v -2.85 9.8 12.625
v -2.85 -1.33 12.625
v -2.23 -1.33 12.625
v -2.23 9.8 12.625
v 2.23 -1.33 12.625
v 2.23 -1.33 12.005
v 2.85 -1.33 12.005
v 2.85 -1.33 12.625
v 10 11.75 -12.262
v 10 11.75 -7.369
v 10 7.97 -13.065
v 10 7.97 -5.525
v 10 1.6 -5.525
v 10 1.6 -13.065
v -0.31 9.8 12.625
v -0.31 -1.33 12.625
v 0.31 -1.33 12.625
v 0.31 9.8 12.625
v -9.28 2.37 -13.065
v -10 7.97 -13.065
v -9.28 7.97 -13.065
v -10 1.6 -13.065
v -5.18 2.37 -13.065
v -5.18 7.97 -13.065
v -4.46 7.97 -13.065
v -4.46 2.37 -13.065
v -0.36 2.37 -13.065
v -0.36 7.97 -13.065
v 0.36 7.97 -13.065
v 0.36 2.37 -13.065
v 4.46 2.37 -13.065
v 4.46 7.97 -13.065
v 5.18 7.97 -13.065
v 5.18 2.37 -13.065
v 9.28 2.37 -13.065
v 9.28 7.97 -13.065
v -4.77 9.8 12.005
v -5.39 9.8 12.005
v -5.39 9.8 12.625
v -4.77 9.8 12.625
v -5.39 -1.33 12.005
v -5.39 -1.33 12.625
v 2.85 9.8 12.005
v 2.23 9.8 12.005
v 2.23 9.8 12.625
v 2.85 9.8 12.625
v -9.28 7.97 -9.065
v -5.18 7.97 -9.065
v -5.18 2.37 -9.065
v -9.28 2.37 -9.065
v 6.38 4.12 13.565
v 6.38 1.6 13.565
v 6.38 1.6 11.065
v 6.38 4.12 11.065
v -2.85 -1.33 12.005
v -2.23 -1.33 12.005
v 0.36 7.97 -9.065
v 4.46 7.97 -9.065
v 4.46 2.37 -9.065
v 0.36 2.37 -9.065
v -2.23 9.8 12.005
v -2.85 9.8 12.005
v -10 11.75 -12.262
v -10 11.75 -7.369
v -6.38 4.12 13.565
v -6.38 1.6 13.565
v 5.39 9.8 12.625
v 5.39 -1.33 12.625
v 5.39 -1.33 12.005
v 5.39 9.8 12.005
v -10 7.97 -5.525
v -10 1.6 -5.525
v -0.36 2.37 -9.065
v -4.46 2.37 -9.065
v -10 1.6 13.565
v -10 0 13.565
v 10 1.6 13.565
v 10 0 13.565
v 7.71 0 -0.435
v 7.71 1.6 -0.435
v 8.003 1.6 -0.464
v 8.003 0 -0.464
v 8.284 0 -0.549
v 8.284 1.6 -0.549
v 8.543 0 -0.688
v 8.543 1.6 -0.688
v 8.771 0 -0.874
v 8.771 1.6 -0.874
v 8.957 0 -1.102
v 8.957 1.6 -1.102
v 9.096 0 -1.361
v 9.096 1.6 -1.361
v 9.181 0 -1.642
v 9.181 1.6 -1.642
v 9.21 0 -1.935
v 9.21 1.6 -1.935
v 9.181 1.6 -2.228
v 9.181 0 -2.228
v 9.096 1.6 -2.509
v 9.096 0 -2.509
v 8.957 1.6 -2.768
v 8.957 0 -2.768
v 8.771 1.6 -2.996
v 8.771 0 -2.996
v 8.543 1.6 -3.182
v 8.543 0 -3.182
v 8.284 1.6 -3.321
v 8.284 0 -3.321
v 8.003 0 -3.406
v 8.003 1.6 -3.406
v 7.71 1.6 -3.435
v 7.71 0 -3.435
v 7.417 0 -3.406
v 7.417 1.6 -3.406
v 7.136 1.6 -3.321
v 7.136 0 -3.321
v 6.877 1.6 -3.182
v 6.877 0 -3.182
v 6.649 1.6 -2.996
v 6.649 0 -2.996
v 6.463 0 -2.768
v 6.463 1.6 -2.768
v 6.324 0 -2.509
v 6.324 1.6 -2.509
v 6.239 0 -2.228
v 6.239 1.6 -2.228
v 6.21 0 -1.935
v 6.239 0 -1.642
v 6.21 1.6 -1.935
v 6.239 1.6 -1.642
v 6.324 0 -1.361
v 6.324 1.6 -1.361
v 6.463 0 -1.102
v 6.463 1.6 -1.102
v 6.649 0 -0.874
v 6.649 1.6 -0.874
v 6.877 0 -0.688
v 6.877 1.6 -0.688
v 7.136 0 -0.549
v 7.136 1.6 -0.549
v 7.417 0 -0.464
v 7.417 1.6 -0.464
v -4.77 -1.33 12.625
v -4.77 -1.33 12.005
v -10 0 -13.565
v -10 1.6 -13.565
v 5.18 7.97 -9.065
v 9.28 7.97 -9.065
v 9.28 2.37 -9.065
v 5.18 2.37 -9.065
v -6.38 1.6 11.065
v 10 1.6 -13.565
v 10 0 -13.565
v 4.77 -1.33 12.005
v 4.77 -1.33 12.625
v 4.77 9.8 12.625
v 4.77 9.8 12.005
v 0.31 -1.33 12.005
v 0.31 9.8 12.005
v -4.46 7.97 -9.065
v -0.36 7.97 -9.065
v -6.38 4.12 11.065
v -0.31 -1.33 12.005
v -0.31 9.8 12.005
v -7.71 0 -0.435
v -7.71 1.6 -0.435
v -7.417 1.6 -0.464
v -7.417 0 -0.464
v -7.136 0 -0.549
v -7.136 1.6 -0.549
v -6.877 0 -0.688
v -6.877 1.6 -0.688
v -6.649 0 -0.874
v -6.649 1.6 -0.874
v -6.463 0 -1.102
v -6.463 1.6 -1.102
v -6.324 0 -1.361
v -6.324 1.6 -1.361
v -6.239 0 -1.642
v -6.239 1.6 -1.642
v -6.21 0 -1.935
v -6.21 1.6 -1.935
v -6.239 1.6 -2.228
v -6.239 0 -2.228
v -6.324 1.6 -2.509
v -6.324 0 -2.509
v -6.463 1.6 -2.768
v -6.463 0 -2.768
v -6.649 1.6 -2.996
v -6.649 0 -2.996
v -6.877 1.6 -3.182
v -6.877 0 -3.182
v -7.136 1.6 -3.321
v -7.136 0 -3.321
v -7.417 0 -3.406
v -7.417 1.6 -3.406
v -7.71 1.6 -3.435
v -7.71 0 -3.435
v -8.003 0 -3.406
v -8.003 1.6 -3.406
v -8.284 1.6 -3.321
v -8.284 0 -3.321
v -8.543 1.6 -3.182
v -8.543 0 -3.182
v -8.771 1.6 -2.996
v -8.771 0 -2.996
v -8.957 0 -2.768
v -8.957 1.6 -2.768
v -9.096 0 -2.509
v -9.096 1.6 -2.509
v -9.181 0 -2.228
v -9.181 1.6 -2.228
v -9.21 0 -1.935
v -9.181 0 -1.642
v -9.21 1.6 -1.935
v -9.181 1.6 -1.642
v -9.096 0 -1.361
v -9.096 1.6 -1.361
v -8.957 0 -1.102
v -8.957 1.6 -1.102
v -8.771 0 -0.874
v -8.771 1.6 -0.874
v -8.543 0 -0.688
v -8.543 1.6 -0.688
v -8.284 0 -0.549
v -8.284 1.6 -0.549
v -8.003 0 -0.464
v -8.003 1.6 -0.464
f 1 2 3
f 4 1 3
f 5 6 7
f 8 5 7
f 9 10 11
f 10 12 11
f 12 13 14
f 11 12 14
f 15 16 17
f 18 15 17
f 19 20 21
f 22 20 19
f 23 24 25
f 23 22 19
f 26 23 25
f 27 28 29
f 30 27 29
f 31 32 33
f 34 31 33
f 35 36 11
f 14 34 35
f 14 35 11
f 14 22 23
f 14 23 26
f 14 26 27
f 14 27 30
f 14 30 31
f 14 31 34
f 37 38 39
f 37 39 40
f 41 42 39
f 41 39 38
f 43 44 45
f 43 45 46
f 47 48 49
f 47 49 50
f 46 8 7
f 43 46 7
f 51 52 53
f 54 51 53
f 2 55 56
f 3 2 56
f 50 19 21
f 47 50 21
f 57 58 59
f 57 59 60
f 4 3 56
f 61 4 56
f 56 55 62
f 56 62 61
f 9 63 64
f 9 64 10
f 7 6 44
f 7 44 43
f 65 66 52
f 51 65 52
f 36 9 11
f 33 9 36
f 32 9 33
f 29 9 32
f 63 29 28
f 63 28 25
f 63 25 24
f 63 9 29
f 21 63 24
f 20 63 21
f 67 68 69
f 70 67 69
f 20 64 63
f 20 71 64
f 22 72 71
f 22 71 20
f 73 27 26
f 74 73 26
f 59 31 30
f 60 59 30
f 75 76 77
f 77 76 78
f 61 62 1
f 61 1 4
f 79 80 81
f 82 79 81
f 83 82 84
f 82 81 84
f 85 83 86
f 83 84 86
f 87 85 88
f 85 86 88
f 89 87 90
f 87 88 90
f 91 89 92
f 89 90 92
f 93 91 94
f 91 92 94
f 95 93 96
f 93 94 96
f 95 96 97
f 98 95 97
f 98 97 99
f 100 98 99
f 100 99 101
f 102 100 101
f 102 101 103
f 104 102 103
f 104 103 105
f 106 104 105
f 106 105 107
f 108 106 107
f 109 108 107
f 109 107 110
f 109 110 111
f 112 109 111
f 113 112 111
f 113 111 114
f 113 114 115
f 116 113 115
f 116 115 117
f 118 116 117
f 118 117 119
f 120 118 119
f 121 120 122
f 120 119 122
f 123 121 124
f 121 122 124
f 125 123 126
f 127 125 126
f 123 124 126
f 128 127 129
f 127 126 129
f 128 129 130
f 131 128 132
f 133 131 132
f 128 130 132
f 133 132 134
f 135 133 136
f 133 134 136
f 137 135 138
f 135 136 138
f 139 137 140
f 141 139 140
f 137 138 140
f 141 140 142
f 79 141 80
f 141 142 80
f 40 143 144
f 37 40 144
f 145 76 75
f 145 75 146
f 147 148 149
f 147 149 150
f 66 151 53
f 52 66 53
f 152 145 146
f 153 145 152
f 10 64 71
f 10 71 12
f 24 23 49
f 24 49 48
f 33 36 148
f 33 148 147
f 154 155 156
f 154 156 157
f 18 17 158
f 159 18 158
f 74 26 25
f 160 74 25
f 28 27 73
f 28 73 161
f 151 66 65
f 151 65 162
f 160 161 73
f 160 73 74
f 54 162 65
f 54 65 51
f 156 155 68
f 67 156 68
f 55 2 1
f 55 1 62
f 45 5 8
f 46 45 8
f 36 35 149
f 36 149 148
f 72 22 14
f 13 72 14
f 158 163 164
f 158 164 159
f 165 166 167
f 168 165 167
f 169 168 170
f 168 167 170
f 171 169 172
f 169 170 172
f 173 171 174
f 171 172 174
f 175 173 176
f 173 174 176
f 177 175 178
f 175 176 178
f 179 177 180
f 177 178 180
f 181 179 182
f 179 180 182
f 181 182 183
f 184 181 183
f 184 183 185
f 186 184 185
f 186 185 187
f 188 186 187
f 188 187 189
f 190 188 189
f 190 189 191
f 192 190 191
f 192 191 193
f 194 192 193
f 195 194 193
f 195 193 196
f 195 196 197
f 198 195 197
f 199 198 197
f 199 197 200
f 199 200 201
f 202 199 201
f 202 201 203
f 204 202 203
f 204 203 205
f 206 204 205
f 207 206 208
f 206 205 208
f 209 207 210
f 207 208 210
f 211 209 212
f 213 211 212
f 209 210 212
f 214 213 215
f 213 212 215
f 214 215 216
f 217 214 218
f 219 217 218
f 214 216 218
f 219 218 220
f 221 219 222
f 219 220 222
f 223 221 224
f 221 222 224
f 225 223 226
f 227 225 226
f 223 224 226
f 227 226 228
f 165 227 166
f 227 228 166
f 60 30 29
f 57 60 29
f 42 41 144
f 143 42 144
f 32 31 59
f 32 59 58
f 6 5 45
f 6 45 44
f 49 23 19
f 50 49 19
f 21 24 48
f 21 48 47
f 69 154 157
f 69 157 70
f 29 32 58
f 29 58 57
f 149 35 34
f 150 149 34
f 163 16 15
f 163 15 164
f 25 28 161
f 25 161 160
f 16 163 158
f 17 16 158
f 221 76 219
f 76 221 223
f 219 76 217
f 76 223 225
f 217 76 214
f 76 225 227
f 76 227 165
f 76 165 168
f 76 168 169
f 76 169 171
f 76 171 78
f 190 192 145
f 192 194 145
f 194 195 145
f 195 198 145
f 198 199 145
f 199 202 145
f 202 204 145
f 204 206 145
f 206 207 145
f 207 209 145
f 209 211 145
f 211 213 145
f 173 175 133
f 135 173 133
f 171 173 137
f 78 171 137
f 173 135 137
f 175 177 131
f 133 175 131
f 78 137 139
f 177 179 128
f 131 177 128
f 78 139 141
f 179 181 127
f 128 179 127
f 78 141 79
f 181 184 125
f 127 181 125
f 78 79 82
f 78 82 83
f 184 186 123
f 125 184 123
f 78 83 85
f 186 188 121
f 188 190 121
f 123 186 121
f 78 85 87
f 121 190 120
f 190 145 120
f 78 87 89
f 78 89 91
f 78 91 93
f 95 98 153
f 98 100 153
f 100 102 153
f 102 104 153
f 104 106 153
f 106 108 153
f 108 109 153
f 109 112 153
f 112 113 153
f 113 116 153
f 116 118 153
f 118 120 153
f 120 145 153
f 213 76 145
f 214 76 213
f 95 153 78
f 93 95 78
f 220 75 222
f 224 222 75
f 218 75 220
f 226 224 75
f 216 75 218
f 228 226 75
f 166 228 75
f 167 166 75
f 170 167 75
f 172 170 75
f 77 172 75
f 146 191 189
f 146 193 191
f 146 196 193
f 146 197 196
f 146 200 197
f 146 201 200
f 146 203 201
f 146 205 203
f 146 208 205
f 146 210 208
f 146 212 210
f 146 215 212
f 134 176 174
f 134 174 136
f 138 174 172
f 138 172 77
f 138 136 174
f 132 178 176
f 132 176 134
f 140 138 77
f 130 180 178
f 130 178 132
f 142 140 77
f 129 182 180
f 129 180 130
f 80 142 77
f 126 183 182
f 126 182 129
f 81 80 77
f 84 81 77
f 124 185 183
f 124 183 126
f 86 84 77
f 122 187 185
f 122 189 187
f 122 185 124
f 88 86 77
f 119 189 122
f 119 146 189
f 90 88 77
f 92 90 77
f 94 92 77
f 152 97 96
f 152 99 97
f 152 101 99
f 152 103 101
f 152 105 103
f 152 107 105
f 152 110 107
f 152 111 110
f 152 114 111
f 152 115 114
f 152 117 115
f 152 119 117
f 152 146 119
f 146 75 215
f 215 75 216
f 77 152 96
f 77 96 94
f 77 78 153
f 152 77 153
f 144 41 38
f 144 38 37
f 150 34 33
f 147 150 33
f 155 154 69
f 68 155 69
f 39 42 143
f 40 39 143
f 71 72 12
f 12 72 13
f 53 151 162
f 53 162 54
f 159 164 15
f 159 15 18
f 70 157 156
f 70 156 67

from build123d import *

# Parameters (mm, degrees)
SKETCH1_W                  = 20
SKETCH1_H                  = 27.13
BOSS_EXTRUDE1_DEPTH        = 1.6
SKETCH2_W                  = 12.76
SKETCH2_H                  = 2.5
BOSS_EXTRUDE2_DEPTH        = 2.52
BOSS_EXTRUDE3_DEPTH        = 5.68
BOSS_EXTRUDE3_DEPTH_BACK   = 5.45
SKETCH3_W                  = 0.62
SKETCH3_H                  = 0.62
BOSS_EXTRUDE3_2_DEPTH      = 5.68
BOSS_EXTRUDE3_2_DEPTH_BACK = 5.45
BOSS_EXTRUDE3_3_DEPTH      = 5.68
BOSS_EXTRUDE3_3_DEPTH_BACK = 5.45
BOSS_EXTRUDE3_4_DEPTH      = 5.68
BOSS_EXTRUDE3_4_DEPTH_BACK = 5.45
BOSS_EXTRUDE3_5_DEPTH      = 5.68
BOSS_EXTRUDE3_5_DEPTH_BACK = 5.45
SKETCH4_W                  = 20
SKETCH4_H                  = 7.54
BOSS_EXTRUDE4_DEPTH        = 10.15
SKETCH5_W                  = 4.1
SKETCH5_H                  = 5.6
CUT_EXTRUDE1_DEPTH         = 4
CHAMFER1_SIZE              = 0.803463803
CHAMFER1_SIZE_2            = 3.78
CHAMFER2_SIZE              = 3.78
CHAMFER2_SIZE2             = 1.843629185
SKETCH6_R                  = 1.5
CUT_EXTRUDE2_DEPTH         = 20.673121893


with BuildPart() as part:
    # Sketch1 → Boss-Extrude1 (new body)
    with BuildSketch(Plane(origin=(0, 0, 0), x_dir=(1, 0, 0), z_dir=(0, 1, 0))):
        Rectangle(SKETCH1_W, SKETCH1_H)
    extrude(amount=BOSS_EXTRUDE1_DEPTH)

    # Sketch6 → Cut-Extrude2 (cut, through all)
    with BuildSketch(Plane(origin=(0, 1.6, 0), x_dir=(1, 0, 0), z_dir=(0, 1, 0))):
        with Locations(Location((-7.71, 1.935, 0), (0, 0, 270))):
            Circle(SKETCH6_R)
        with Locations(Location((7.71, 1.935, 0), (0, 0, 270))):
            Circle(SKETCH6_R)
    extrude(amount=-CUT_EXTRUDE2_DEPTH, mode=Mode.SUBTRACT)


with BuildPart() as body_2:
    # Sketch2 → Boss-Extrude2 (new body)
    with BuildSketch(Plane(origin=(0, 1.6, 0), x_dir=(1, 0, 0), z_dir=(0, 1, 0))):
        with Locations((0, -12.315)):
            Rectangle(SKETCH2_W, SKETCH2_H)
    extrude(amount=BOSS_EXTRUDE2_DEPTH)


with BuildPart() as body_3:
    # Sketch3 → Boss-Extrude3 (new, two sides: drawn at the far end of the back side and taken through both)
    with BuildSketch(Plane(origin=(0, 4.12, 0), x_dir=(1, 0, 0), z_dir=(0, 1, 0)).offset(-BOSS_EXTRUDE3_DEPTH_BACK)):
        with Locations((-5.08, -12.315)):
            Rectangle(SKETCH3_W, SKETCH3_H)
    extrude(amount=BOSS_EXTRUDE3_DEPTH + BOSS_EXTRUDE3_DEPTH_BACK)


with BuildPart() as body_4:
    # Sketch3 → Boss-Extrude3 2 (new, two sides: drawn at the far end of the back side and taken through both)
    with BuildSketch(Plane(origin=(0, 4.12, 0), x_dir=(1, 0, 0), z_dir=(0, 1, 0)).offset(-BOSS_EXTRUDE3_2_DEPTH_BACK)):
        with Locations((-2.54, -12.315)):
            Rectangle(SKETCH3_W, SKETCH3_H)
    extrude(amount=BOSS_EXTRUDE3_2_DEPTH + BOSS_EXTRUDE3_2_DEPTH_BACK)


with BuildPart() as body_5:
    # Sketch3 → Boss-Extrude3 3 (new, two sides: drawn at the far end of the back side and taken through both)
    with BuildSketch(Plane(origin=(0, 4.12, 0), x_dir=(1, 0, 0), z_dir=(0, 1, 0)).offset(-BOSS_EXTRUDE3_3_DEPTH_BACK)):
        with Locations((0, -12.315)):
            Rectangle(SKETCH3_W, SKETCH3_H)
    extrude(amount=BOSS_EXTRUDE3_3_DEPTH + BOSS_EXTRUDE3_3_DEPTH_BACK)


with BuildPart() as body_6:
    # Sketch3 → Boss-Extrude3 4 (new, two sides: drawn at the far end of the back side and taken through both)
    with BuildSketch(Plane(origin=(0, 4.12, 0), x_dir=(1, 0, 0), z_dir=(0, 1, 0)).offset(-BOSS_EXTRUDE3_4_DEPTH_BACK)):
        with Locations((2.54, -12.315)):
            Rectangle(SKETCH3_W, SKETCH3_H)
    extrude(amount=BOSS_EXTRUDE3_4_DEPTH + BOSS_EXTRUDE3_4_DEPTH_BACK)


with BuildPart() as body_7:
    # Sketch3 → Boss-Extrude3 5 (new, two sides: drawn at the far end of the back side and taken through both)
    with BuildSketch(Plane(origin=(0, 4.12, 0), x_dir=(1, 0, 0), z_dir=(0, 1, 0)).offset(-BOSS_EXTRUDE3_5_DEPTH_BACK)):
        with Locations((5.08, -12.315)):
            Rectangle(SKETCH3_W, SKETCH3_H)
    extrude(amount=BOSS_EXTRUDE3_5_DEPTH + BOSS_EXTRUDE3_5_DEPTH_BACK)


with BuildPart() as body_8:
    # Sketch4 → Boss-Extrude4 (new body)
    with BuildSketch(Plane(origin=(0, 1.6, 0), x_dir=(1, 0, 0), z_dir=(0, 1, 0))):
        with Locations((0, 9.295)):
            Rectangle(SKETCH4_W, SKETCH4_H)
    extrude(amount=BOSS_EXTRUDE4_DEPTH)

    # Sketch5 → Cut-Extrude1 (cut)
    with BuildSketch(Plane(origin=(0, 0, -13.065), x_dir=(-1, 0, 0), z_dir=(0, 0, -1))):
        with Locations((-7.23, 5.17)):
            Rectangle(SKETCH5_W, SKETCH5_H)
        with Locations((-2.41, 5.17)):
            Rectangle(SKETCH5_W, SKETCH5_H)
        with Locations((2.41, 5.17)):
            Rectangle(SKETCH5_W, SKETCH5_H)
        with Locations((7.23, 5.17)):
            Rectangle(SKETCH5_W, SKETCH5_H)
    extrude(amount=-CUT_EXTRUDE1_DEPTH, mode=Mode.SUBTRACT)

    # Chamfer1
    # the kernel refuses this chamfer: 3.78, 0.803463803 mm, written as the material it takes off along each edge
    with BuildSketch(Plane(origin=(-19.820054281, 11.75, -13.065), x_dir=(0, 0.1744265095150599, 0.9846701949274146), z_dir=(1, 0, 0))) as chamfer1_piece_1:
        Polygon((CHAMFER1_SIZE * 0.984670195066, CHAMFER1_SIZE * 0.17442650954), (-CHAMFER1_SIZE_2 * 0.174426509515, CHAMFER1_SIZE_2 * 0.984670194927), (0, 0), align=None)
    extrude(amount=39.640108563, mode=Mode.SUBTRACT)

    # Chamfer2
    chamfer2_edges = [body_8.edges().sort_by_distance(p)[0] for p in [
        (0, 11.75, -5.525),
    ]]
    chamfer2_side = [body_8.faces().sort_by_distance(p)[0] for p in [
        (0, 6.675, -5.525),
    ]]
    chamfer(chamfer2_edges, length=CHAMFER2_SIZE, length2=CHAMFER2_SIZE2, reference=chamfer2_side[0])


solid = Compound([part.part, body_2.part, body_3.part, body_4.part, body_5.part, body_6.part, body_7.part, body_8.part])
